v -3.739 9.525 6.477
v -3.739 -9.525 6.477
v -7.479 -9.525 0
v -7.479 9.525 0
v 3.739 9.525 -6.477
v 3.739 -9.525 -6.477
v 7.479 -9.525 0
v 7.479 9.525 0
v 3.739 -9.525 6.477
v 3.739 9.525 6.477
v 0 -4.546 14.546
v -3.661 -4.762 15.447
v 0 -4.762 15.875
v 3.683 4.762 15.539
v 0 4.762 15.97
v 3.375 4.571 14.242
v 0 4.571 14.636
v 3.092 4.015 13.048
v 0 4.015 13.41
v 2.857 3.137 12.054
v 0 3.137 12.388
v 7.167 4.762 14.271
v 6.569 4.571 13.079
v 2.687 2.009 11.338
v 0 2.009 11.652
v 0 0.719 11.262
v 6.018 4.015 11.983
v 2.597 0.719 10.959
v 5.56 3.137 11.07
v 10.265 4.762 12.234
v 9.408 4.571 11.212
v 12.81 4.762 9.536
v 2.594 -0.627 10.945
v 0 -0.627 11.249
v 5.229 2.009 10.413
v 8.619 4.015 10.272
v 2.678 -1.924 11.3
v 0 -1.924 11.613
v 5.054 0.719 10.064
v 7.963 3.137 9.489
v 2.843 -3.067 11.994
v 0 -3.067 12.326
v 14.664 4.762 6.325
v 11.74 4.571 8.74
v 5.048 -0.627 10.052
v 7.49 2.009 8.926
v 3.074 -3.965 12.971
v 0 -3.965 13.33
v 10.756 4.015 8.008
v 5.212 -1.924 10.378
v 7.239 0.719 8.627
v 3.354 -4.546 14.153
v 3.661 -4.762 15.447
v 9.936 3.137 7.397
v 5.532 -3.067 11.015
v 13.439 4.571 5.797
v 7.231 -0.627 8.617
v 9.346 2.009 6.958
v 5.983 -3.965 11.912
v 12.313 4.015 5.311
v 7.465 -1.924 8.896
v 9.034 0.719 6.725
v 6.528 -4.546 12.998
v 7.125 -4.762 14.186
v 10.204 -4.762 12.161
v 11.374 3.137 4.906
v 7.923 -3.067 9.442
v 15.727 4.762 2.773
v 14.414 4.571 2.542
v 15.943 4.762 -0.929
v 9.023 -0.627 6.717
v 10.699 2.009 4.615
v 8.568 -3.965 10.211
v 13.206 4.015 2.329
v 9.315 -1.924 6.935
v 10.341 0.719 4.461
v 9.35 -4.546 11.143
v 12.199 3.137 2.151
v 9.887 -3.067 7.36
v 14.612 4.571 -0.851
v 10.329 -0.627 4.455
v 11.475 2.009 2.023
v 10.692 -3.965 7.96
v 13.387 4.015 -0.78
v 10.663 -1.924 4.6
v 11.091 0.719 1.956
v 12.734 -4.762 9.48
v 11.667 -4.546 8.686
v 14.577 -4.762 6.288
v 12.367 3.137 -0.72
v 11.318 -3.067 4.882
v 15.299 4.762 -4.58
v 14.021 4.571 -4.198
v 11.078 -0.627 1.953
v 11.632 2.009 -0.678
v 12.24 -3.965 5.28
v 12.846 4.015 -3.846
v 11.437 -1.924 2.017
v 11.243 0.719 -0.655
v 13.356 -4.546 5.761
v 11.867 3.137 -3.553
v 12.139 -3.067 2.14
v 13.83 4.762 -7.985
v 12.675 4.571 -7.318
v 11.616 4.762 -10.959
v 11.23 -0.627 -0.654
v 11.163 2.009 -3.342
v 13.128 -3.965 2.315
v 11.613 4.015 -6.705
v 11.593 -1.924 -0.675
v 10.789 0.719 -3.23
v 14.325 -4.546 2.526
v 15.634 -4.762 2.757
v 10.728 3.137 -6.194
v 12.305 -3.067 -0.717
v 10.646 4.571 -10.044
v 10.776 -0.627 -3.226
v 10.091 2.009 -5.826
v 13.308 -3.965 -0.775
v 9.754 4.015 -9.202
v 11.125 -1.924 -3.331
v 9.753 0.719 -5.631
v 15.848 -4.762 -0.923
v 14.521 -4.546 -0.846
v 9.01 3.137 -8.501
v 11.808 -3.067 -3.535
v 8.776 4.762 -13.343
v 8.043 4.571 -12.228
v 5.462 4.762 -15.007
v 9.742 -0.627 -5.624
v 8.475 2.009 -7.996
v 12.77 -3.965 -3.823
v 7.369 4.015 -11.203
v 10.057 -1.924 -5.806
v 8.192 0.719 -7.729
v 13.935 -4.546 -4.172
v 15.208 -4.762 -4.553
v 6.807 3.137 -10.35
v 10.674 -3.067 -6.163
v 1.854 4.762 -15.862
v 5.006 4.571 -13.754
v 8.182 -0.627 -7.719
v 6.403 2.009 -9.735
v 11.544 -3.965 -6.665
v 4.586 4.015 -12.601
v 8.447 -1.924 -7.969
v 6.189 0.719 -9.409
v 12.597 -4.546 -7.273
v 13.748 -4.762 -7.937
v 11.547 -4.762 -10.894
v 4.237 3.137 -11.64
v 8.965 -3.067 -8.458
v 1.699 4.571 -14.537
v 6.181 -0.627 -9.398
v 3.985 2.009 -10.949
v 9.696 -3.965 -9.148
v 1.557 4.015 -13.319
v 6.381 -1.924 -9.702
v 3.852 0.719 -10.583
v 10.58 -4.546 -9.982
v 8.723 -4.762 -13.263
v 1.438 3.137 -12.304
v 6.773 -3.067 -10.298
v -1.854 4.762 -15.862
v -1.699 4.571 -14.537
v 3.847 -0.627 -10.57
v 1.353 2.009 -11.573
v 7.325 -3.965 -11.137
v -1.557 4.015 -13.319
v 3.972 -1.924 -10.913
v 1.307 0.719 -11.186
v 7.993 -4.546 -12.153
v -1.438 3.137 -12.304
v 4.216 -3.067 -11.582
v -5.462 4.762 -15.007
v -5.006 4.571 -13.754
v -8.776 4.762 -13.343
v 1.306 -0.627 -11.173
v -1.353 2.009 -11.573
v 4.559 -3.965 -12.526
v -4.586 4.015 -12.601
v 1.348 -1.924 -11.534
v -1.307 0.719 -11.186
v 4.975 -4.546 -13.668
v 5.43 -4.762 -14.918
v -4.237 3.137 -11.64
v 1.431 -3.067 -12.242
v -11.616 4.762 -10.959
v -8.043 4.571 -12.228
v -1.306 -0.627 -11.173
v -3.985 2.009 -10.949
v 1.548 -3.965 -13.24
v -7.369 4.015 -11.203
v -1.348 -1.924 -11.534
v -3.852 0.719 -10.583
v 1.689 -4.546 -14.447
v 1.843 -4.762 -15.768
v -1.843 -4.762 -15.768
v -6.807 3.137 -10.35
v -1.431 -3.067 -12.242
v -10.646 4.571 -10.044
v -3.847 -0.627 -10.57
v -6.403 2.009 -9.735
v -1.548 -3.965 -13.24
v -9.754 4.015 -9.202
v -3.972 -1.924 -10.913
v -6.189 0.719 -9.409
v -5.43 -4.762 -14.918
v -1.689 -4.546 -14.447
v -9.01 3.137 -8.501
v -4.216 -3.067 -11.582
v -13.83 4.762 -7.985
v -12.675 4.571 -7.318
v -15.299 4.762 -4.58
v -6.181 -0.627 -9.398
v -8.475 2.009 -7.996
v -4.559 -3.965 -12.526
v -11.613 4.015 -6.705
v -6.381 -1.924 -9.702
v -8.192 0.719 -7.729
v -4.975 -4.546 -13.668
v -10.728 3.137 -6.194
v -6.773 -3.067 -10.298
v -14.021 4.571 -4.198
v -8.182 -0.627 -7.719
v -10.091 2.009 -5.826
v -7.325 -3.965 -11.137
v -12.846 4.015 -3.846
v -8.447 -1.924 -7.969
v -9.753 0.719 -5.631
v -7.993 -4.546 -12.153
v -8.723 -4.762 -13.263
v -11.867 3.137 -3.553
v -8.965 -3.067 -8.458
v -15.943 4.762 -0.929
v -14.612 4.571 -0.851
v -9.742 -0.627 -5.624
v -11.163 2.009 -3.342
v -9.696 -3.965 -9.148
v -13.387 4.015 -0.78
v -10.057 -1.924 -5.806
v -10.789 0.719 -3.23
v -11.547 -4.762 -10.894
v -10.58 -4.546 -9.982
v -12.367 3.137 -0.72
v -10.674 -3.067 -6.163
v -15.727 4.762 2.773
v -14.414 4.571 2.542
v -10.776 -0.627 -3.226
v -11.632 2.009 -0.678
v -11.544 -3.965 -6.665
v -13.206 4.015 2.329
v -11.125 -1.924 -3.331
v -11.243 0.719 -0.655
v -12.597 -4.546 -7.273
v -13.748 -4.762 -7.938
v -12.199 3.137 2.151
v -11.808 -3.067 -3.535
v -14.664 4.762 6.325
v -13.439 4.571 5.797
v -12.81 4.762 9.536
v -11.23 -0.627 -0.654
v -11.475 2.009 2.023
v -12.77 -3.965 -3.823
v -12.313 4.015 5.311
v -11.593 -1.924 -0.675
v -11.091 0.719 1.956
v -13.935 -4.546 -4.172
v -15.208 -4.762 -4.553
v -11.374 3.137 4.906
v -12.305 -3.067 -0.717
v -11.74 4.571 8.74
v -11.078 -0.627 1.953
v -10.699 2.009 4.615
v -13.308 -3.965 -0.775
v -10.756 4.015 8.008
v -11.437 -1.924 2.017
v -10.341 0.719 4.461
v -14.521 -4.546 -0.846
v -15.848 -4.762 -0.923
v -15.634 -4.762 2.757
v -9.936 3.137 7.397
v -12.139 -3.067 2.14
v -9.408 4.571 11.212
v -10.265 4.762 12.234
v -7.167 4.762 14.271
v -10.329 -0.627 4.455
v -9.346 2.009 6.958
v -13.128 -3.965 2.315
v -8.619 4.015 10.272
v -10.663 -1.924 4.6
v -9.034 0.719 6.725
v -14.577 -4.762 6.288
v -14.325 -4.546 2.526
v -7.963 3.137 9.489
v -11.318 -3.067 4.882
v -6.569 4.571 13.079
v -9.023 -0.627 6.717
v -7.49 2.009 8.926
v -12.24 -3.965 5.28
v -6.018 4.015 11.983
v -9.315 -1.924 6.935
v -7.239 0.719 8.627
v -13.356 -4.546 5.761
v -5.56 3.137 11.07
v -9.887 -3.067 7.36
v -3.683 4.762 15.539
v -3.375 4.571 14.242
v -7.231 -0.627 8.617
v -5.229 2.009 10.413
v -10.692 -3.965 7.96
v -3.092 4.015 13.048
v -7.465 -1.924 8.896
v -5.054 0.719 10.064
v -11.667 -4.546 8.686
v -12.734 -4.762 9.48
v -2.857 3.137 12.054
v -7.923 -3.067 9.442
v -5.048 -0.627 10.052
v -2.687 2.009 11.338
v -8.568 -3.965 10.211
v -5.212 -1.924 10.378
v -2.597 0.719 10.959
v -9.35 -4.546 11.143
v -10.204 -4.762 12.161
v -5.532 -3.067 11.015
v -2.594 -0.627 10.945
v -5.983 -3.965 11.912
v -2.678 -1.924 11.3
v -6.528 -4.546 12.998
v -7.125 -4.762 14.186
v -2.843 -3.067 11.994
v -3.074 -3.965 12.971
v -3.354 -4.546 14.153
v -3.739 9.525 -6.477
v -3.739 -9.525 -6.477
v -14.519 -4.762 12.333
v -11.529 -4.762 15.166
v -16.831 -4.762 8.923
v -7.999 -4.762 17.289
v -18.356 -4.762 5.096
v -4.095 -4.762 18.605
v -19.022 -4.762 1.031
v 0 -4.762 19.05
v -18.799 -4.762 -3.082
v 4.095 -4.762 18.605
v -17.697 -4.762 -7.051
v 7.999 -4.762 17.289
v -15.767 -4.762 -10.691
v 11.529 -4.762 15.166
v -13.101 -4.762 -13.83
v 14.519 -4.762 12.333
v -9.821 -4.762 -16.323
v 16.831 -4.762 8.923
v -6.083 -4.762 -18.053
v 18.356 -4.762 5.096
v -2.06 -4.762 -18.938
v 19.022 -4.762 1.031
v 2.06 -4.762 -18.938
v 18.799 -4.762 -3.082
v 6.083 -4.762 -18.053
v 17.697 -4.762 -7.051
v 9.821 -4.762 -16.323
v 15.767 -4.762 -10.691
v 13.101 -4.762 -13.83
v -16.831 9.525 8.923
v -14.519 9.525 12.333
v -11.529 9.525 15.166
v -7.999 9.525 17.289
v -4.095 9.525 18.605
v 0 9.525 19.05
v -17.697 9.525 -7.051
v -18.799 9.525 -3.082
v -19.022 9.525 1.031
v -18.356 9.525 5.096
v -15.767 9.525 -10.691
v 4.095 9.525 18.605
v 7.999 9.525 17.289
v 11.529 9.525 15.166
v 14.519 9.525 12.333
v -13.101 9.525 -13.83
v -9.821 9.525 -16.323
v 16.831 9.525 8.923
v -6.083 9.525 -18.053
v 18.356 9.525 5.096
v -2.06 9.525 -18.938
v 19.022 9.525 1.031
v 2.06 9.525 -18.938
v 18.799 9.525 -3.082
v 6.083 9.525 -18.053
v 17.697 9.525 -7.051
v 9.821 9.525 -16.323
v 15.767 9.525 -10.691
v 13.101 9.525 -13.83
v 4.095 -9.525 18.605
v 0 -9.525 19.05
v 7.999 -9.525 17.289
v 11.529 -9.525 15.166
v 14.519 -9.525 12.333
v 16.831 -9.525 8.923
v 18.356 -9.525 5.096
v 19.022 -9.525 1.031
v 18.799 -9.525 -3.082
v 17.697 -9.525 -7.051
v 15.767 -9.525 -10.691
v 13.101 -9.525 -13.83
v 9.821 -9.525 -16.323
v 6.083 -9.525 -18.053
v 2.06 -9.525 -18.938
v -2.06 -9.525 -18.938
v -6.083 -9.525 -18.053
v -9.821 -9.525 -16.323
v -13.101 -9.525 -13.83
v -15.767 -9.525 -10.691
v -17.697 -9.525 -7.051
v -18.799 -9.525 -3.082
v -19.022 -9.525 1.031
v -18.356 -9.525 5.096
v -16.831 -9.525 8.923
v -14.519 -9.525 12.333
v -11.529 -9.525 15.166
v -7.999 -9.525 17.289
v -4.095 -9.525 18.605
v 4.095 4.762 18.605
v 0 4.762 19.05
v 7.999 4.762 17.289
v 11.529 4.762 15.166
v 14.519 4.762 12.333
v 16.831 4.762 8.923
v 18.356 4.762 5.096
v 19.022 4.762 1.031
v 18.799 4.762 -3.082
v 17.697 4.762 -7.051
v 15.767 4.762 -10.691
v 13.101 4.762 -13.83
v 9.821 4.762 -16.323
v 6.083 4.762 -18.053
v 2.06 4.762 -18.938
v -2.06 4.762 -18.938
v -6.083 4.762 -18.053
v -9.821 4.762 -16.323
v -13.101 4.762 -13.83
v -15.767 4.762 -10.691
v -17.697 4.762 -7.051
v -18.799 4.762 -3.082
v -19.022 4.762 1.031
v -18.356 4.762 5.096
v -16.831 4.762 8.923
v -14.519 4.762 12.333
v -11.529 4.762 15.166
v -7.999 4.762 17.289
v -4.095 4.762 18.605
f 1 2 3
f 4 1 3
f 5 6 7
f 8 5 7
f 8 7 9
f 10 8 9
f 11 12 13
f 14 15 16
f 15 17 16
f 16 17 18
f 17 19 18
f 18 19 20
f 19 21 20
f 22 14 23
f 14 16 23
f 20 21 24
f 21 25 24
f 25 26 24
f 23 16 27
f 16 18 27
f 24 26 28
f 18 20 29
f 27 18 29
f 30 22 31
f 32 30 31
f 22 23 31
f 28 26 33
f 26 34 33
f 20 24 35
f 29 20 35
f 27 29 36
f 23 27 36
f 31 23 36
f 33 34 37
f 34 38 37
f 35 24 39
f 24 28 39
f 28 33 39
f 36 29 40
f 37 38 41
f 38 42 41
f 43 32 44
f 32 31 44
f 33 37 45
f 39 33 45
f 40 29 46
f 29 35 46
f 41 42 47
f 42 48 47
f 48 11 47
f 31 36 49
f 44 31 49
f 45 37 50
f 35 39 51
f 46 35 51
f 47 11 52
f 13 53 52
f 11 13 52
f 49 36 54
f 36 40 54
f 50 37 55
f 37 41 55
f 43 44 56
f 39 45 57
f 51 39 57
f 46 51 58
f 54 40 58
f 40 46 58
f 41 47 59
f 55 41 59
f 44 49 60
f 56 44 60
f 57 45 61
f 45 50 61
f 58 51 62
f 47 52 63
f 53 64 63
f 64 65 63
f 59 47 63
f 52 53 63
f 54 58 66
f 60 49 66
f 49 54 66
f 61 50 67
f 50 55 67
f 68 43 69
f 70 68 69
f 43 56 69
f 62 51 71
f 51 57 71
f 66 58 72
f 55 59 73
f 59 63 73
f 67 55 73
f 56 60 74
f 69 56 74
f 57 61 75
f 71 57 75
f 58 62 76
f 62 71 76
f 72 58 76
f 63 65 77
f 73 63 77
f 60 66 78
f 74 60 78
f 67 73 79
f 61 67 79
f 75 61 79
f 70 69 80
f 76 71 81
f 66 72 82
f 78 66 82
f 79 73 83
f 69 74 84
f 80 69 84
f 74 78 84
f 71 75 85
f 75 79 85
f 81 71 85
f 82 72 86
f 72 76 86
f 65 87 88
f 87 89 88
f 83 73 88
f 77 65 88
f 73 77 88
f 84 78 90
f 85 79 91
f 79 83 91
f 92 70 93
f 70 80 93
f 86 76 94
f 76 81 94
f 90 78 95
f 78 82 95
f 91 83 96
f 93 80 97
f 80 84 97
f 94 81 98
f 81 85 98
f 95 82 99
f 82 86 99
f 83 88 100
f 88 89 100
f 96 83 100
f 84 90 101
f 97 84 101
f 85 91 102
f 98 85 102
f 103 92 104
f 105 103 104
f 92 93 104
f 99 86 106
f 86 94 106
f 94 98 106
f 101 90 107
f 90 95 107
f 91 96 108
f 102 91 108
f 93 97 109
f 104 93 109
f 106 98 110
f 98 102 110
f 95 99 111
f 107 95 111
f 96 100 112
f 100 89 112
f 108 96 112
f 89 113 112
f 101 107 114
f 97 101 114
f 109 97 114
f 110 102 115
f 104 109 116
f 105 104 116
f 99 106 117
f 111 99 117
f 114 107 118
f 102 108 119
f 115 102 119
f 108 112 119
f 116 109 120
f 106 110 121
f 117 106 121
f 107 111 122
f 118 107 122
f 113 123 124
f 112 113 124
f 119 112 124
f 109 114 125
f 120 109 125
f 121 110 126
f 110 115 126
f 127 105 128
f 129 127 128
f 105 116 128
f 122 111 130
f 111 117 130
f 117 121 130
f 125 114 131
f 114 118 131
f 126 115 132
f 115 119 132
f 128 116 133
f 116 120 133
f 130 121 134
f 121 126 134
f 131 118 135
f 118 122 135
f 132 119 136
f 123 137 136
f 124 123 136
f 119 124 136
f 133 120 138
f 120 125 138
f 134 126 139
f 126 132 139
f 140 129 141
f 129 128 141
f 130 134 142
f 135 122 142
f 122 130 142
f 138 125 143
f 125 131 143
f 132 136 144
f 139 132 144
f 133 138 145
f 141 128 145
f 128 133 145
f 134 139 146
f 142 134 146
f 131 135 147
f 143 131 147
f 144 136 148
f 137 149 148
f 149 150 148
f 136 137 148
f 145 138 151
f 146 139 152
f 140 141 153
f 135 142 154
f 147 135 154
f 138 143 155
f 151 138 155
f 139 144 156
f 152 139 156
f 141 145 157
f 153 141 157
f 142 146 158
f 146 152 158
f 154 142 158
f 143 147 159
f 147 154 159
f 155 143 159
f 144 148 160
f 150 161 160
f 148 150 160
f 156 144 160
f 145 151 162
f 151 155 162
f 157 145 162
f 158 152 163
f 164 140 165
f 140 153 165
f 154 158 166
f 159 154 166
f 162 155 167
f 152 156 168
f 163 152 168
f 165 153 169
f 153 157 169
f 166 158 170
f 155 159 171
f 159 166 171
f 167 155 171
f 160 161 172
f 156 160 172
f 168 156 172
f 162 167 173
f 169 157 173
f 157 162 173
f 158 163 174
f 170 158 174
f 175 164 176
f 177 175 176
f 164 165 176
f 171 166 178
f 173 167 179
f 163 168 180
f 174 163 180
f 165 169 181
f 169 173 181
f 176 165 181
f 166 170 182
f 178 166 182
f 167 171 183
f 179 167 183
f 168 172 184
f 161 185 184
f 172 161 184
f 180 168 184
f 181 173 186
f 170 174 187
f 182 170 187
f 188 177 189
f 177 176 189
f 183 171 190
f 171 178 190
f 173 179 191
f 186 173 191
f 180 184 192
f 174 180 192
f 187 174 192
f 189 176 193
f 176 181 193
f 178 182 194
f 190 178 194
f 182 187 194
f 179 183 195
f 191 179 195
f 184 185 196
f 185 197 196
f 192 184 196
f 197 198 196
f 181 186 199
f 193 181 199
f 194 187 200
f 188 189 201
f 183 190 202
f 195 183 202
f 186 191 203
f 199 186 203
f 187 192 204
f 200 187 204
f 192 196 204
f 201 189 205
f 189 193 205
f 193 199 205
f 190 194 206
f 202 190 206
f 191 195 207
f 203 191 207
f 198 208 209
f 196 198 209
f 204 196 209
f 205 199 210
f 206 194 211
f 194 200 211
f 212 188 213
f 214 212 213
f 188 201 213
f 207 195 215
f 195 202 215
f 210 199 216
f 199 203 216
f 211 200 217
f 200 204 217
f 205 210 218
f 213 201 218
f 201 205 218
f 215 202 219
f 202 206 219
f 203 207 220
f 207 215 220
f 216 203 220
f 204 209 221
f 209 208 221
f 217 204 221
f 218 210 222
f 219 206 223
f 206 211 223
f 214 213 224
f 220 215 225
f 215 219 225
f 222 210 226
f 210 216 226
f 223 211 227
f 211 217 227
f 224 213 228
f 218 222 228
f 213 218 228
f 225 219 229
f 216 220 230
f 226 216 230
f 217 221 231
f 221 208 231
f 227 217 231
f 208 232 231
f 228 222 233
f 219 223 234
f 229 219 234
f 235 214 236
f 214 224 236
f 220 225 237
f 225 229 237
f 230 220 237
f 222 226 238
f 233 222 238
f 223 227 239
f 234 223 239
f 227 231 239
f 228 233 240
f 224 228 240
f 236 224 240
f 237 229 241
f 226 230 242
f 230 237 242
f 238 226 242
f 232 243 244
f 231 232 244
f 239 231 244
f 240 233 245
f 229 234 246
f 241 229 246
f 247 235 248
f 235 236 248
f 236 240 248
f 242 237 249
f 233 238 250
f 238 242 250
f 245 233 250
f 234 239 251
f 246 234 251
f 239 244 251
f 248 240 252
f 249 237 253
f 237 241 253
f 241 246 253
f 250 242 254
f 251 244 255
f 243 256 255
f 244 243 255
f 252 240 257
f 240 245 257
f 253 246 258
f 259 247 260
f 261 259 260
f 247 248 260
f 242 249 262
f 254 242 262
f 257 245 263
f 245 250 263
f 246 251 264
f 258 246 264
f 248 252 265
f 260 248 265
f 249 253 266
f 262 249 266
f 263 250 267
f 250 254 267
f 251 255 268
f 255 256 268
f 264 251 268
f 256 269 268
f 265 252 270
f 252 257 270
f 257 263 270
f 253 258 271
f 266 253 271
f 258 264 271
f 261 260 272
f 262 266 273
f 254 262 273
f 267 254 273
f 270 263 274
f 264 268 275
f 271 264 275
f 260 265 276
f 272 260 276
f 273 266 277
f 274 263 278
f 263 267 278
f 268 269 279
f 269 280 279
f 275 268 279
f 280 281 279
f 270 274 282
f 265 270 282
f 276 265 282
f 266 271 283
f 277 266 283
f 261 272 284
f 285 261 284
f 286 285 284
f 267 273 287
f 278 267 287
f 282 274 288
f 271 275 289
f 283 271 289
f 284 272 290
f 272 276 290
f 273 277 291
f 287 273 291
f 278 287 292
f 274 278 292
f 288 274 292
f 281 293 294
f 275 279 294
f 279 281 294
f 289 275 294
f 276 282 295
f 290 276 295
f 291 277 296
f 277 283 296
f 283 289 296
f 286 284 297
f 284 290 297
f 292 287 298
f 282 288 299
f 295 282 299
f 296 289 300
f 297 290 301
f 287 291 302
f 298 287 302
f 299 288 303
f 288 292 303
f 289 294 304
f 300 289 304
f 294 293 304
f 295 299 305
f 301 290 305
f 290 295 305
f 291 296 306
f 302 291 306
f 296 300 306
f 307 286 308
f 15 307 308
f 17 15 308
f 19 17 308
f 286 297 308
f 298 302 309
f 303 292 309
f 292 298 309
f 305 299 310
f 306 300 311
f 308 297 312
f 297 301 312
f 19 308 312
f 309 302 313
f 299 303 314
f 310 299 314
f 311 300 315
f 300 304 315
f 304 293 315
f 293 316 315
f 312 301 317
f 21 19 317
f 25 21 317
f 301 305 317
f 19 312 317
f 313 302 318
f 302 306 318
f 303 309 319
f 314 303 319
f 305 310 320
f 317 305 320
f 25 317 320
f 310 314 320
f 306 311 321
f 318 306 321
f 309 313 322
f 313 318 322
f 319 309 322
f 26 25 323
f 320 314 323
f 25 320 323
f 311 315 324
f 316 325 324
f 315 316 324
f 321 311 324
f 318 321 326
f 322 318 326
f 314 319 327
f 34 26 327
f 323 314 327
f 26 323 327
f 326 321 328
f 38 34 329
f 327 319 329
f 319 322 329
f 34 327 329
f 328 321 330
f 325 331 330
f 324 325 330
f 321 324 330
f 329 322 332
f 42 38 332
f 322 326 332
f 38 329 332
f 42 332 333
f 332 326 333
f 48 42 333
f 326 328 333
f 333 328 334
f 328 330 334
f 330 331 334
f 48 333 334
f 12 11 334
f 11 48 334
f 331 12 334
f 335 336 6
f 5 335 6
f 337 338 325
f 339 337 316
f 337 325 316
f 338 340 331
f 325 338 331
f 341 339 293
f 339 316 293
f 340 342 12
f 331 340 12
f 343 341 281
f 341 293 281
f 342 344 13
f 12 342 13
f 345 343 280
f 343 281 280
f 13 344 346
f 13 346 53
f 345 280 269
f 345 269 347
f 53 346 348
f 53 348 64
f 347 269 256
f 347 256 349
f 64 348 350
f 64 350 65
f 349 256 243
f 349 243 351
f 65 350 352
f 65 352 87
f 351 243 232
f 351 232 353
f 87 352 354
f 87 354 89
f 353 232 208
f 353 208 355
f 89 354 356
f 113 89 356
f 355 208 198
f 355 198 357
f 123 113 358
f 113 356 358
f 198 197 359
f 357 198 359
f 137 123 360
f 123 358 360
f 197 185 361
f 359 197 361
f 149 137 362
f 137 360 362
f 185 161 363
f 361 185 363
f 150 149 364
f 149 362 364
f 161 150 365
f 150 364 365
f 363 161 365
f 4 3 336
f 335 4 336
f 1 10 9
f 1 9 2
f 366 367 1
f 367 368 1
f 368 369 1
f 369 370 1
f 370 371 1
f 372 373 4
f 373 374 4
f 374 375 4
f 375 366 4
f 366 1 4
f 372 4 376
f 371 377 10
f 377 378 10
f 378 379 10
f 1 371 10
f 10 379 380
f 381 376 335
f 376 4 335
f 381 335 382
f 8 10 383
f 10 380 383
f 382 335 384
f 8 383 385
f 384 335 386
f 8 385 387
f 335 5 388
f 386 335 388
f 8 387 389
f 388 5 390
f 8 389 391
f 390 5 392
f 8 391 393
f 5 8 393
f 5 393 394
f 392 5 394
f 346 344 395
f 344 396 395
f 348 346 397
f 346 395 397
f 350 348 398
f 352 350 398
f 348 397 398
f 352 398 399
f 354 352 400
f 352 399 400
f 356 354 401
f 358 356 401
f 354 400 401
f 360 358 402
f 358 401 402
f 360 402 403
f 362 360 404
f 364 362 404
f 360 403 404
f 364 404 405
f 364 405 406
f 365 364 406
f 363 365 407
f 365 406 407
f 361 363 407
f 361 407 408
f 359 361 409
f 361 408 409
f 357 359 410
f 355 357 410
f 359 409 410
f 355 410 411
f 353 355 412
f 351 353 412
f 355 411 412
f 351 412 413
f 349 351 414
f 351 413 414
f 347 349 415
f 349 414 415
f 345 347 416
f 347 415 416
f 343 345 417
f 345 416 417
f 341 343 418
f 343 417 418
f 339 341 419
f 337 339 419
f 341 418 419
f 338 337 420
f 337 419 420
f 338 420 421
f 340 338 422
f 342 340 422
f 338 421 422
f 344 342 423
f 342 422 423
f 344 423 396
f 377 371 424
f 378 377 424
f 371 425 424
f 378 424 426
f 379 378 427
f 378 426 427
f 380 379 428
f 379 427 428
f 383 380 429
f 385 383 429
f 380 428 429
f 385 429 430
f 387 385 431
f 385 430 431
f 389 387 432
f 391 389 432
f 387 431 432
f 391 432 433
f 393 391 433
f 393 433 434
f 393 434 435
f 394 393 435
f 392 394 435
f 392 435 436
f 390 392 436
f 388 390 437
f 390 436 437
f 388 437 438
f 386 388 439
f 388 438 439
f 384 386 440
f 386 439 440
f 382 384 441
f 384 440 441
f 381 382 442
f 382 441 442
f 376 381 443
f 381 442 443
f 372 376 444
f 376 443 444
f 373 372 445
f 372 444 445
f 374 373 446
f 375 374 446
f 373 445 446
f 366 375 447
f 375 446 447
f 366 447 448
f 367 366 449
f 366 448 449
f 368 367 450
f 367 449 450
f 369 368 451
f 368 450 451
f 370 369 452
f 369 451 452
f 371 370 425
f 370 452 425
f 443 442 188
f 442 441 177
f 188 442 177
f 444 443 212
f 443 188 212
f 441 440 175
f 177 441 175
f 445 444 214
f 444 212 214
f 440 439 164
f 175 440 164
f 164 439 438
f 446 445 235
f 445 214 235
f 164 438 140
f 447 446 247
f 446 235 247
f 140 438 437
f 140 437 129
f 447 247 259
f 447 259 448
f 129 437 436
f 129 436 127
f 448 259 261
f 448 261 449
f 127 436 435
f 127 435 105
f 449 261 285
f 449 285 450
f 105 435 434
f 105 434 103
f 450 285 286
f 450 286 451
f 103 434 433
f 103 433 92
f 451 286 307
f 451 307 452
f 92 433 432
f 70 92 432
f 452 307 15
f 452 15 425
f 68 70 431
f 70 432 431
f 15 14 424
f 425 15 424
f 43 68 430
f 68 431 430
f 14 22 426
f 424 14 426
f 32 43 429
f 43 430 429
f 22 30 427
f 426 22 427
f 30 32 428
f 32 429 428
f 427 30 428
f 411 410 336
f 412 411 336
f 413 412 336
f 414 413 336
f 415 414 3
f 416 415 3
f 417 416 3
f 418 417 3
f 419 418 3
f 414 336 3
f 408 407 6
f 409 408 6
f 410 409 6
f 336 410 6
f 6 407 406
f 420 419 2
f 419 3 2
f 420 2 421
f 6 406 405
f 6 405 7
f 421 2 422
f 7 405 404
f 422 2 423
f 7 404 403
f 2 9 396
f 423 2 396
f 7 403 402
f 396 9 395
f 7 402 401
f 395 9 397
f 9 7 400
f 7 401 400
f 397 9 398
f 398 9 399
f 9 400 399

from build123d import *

# Parameters (mm, degrees)
F3_DEPTH = 12.7


with BuildPart() as f2:
    # F1 (on Right) → F2 (revolve)
    with BuildSketch(Plane.YZ):
        with BuildLine():
            Line((-4.7625, 15.875), (-4.7625, 19.05))
            Line((-4.7625, 19.05), (-9.525, 19.05))
            Line((-9.525, 19.05), (-9.525, 0))
            Line((-9.525, 0), (9.525, 0))
            Line((9.525, 0), (9.525, 19.05))
            Line((9.525, 19.05), (4.7615565856, 19.05))
            Line((4.7615565856, 19.05), (4.7615565856, 15.9697899354))
            ThreePointArc((4.7615565856, 15.9697899354), (0.0464539006, 11.2075257948), (-4.7625, 15.875))
        make_face()
    revolve(axis=Axis((0, 0, 0), (0, 1, 0)))

    # F0 (on Front) → F3 (cut, symmetric)
    with BuildSketch(Plane.XZ):
        Polygon((3.7394976935, 6.477), (-3.7394976935, 6.477), (-7.4789953871, 0), (-3.7394976935, -6.477), (3.7394976935, -6.477), (7.4789953871, 0), align=None)
    extrude(amount=F3_DEPTH, both=True, mode=Mode.SUBTRACT)


solid = f2.part
